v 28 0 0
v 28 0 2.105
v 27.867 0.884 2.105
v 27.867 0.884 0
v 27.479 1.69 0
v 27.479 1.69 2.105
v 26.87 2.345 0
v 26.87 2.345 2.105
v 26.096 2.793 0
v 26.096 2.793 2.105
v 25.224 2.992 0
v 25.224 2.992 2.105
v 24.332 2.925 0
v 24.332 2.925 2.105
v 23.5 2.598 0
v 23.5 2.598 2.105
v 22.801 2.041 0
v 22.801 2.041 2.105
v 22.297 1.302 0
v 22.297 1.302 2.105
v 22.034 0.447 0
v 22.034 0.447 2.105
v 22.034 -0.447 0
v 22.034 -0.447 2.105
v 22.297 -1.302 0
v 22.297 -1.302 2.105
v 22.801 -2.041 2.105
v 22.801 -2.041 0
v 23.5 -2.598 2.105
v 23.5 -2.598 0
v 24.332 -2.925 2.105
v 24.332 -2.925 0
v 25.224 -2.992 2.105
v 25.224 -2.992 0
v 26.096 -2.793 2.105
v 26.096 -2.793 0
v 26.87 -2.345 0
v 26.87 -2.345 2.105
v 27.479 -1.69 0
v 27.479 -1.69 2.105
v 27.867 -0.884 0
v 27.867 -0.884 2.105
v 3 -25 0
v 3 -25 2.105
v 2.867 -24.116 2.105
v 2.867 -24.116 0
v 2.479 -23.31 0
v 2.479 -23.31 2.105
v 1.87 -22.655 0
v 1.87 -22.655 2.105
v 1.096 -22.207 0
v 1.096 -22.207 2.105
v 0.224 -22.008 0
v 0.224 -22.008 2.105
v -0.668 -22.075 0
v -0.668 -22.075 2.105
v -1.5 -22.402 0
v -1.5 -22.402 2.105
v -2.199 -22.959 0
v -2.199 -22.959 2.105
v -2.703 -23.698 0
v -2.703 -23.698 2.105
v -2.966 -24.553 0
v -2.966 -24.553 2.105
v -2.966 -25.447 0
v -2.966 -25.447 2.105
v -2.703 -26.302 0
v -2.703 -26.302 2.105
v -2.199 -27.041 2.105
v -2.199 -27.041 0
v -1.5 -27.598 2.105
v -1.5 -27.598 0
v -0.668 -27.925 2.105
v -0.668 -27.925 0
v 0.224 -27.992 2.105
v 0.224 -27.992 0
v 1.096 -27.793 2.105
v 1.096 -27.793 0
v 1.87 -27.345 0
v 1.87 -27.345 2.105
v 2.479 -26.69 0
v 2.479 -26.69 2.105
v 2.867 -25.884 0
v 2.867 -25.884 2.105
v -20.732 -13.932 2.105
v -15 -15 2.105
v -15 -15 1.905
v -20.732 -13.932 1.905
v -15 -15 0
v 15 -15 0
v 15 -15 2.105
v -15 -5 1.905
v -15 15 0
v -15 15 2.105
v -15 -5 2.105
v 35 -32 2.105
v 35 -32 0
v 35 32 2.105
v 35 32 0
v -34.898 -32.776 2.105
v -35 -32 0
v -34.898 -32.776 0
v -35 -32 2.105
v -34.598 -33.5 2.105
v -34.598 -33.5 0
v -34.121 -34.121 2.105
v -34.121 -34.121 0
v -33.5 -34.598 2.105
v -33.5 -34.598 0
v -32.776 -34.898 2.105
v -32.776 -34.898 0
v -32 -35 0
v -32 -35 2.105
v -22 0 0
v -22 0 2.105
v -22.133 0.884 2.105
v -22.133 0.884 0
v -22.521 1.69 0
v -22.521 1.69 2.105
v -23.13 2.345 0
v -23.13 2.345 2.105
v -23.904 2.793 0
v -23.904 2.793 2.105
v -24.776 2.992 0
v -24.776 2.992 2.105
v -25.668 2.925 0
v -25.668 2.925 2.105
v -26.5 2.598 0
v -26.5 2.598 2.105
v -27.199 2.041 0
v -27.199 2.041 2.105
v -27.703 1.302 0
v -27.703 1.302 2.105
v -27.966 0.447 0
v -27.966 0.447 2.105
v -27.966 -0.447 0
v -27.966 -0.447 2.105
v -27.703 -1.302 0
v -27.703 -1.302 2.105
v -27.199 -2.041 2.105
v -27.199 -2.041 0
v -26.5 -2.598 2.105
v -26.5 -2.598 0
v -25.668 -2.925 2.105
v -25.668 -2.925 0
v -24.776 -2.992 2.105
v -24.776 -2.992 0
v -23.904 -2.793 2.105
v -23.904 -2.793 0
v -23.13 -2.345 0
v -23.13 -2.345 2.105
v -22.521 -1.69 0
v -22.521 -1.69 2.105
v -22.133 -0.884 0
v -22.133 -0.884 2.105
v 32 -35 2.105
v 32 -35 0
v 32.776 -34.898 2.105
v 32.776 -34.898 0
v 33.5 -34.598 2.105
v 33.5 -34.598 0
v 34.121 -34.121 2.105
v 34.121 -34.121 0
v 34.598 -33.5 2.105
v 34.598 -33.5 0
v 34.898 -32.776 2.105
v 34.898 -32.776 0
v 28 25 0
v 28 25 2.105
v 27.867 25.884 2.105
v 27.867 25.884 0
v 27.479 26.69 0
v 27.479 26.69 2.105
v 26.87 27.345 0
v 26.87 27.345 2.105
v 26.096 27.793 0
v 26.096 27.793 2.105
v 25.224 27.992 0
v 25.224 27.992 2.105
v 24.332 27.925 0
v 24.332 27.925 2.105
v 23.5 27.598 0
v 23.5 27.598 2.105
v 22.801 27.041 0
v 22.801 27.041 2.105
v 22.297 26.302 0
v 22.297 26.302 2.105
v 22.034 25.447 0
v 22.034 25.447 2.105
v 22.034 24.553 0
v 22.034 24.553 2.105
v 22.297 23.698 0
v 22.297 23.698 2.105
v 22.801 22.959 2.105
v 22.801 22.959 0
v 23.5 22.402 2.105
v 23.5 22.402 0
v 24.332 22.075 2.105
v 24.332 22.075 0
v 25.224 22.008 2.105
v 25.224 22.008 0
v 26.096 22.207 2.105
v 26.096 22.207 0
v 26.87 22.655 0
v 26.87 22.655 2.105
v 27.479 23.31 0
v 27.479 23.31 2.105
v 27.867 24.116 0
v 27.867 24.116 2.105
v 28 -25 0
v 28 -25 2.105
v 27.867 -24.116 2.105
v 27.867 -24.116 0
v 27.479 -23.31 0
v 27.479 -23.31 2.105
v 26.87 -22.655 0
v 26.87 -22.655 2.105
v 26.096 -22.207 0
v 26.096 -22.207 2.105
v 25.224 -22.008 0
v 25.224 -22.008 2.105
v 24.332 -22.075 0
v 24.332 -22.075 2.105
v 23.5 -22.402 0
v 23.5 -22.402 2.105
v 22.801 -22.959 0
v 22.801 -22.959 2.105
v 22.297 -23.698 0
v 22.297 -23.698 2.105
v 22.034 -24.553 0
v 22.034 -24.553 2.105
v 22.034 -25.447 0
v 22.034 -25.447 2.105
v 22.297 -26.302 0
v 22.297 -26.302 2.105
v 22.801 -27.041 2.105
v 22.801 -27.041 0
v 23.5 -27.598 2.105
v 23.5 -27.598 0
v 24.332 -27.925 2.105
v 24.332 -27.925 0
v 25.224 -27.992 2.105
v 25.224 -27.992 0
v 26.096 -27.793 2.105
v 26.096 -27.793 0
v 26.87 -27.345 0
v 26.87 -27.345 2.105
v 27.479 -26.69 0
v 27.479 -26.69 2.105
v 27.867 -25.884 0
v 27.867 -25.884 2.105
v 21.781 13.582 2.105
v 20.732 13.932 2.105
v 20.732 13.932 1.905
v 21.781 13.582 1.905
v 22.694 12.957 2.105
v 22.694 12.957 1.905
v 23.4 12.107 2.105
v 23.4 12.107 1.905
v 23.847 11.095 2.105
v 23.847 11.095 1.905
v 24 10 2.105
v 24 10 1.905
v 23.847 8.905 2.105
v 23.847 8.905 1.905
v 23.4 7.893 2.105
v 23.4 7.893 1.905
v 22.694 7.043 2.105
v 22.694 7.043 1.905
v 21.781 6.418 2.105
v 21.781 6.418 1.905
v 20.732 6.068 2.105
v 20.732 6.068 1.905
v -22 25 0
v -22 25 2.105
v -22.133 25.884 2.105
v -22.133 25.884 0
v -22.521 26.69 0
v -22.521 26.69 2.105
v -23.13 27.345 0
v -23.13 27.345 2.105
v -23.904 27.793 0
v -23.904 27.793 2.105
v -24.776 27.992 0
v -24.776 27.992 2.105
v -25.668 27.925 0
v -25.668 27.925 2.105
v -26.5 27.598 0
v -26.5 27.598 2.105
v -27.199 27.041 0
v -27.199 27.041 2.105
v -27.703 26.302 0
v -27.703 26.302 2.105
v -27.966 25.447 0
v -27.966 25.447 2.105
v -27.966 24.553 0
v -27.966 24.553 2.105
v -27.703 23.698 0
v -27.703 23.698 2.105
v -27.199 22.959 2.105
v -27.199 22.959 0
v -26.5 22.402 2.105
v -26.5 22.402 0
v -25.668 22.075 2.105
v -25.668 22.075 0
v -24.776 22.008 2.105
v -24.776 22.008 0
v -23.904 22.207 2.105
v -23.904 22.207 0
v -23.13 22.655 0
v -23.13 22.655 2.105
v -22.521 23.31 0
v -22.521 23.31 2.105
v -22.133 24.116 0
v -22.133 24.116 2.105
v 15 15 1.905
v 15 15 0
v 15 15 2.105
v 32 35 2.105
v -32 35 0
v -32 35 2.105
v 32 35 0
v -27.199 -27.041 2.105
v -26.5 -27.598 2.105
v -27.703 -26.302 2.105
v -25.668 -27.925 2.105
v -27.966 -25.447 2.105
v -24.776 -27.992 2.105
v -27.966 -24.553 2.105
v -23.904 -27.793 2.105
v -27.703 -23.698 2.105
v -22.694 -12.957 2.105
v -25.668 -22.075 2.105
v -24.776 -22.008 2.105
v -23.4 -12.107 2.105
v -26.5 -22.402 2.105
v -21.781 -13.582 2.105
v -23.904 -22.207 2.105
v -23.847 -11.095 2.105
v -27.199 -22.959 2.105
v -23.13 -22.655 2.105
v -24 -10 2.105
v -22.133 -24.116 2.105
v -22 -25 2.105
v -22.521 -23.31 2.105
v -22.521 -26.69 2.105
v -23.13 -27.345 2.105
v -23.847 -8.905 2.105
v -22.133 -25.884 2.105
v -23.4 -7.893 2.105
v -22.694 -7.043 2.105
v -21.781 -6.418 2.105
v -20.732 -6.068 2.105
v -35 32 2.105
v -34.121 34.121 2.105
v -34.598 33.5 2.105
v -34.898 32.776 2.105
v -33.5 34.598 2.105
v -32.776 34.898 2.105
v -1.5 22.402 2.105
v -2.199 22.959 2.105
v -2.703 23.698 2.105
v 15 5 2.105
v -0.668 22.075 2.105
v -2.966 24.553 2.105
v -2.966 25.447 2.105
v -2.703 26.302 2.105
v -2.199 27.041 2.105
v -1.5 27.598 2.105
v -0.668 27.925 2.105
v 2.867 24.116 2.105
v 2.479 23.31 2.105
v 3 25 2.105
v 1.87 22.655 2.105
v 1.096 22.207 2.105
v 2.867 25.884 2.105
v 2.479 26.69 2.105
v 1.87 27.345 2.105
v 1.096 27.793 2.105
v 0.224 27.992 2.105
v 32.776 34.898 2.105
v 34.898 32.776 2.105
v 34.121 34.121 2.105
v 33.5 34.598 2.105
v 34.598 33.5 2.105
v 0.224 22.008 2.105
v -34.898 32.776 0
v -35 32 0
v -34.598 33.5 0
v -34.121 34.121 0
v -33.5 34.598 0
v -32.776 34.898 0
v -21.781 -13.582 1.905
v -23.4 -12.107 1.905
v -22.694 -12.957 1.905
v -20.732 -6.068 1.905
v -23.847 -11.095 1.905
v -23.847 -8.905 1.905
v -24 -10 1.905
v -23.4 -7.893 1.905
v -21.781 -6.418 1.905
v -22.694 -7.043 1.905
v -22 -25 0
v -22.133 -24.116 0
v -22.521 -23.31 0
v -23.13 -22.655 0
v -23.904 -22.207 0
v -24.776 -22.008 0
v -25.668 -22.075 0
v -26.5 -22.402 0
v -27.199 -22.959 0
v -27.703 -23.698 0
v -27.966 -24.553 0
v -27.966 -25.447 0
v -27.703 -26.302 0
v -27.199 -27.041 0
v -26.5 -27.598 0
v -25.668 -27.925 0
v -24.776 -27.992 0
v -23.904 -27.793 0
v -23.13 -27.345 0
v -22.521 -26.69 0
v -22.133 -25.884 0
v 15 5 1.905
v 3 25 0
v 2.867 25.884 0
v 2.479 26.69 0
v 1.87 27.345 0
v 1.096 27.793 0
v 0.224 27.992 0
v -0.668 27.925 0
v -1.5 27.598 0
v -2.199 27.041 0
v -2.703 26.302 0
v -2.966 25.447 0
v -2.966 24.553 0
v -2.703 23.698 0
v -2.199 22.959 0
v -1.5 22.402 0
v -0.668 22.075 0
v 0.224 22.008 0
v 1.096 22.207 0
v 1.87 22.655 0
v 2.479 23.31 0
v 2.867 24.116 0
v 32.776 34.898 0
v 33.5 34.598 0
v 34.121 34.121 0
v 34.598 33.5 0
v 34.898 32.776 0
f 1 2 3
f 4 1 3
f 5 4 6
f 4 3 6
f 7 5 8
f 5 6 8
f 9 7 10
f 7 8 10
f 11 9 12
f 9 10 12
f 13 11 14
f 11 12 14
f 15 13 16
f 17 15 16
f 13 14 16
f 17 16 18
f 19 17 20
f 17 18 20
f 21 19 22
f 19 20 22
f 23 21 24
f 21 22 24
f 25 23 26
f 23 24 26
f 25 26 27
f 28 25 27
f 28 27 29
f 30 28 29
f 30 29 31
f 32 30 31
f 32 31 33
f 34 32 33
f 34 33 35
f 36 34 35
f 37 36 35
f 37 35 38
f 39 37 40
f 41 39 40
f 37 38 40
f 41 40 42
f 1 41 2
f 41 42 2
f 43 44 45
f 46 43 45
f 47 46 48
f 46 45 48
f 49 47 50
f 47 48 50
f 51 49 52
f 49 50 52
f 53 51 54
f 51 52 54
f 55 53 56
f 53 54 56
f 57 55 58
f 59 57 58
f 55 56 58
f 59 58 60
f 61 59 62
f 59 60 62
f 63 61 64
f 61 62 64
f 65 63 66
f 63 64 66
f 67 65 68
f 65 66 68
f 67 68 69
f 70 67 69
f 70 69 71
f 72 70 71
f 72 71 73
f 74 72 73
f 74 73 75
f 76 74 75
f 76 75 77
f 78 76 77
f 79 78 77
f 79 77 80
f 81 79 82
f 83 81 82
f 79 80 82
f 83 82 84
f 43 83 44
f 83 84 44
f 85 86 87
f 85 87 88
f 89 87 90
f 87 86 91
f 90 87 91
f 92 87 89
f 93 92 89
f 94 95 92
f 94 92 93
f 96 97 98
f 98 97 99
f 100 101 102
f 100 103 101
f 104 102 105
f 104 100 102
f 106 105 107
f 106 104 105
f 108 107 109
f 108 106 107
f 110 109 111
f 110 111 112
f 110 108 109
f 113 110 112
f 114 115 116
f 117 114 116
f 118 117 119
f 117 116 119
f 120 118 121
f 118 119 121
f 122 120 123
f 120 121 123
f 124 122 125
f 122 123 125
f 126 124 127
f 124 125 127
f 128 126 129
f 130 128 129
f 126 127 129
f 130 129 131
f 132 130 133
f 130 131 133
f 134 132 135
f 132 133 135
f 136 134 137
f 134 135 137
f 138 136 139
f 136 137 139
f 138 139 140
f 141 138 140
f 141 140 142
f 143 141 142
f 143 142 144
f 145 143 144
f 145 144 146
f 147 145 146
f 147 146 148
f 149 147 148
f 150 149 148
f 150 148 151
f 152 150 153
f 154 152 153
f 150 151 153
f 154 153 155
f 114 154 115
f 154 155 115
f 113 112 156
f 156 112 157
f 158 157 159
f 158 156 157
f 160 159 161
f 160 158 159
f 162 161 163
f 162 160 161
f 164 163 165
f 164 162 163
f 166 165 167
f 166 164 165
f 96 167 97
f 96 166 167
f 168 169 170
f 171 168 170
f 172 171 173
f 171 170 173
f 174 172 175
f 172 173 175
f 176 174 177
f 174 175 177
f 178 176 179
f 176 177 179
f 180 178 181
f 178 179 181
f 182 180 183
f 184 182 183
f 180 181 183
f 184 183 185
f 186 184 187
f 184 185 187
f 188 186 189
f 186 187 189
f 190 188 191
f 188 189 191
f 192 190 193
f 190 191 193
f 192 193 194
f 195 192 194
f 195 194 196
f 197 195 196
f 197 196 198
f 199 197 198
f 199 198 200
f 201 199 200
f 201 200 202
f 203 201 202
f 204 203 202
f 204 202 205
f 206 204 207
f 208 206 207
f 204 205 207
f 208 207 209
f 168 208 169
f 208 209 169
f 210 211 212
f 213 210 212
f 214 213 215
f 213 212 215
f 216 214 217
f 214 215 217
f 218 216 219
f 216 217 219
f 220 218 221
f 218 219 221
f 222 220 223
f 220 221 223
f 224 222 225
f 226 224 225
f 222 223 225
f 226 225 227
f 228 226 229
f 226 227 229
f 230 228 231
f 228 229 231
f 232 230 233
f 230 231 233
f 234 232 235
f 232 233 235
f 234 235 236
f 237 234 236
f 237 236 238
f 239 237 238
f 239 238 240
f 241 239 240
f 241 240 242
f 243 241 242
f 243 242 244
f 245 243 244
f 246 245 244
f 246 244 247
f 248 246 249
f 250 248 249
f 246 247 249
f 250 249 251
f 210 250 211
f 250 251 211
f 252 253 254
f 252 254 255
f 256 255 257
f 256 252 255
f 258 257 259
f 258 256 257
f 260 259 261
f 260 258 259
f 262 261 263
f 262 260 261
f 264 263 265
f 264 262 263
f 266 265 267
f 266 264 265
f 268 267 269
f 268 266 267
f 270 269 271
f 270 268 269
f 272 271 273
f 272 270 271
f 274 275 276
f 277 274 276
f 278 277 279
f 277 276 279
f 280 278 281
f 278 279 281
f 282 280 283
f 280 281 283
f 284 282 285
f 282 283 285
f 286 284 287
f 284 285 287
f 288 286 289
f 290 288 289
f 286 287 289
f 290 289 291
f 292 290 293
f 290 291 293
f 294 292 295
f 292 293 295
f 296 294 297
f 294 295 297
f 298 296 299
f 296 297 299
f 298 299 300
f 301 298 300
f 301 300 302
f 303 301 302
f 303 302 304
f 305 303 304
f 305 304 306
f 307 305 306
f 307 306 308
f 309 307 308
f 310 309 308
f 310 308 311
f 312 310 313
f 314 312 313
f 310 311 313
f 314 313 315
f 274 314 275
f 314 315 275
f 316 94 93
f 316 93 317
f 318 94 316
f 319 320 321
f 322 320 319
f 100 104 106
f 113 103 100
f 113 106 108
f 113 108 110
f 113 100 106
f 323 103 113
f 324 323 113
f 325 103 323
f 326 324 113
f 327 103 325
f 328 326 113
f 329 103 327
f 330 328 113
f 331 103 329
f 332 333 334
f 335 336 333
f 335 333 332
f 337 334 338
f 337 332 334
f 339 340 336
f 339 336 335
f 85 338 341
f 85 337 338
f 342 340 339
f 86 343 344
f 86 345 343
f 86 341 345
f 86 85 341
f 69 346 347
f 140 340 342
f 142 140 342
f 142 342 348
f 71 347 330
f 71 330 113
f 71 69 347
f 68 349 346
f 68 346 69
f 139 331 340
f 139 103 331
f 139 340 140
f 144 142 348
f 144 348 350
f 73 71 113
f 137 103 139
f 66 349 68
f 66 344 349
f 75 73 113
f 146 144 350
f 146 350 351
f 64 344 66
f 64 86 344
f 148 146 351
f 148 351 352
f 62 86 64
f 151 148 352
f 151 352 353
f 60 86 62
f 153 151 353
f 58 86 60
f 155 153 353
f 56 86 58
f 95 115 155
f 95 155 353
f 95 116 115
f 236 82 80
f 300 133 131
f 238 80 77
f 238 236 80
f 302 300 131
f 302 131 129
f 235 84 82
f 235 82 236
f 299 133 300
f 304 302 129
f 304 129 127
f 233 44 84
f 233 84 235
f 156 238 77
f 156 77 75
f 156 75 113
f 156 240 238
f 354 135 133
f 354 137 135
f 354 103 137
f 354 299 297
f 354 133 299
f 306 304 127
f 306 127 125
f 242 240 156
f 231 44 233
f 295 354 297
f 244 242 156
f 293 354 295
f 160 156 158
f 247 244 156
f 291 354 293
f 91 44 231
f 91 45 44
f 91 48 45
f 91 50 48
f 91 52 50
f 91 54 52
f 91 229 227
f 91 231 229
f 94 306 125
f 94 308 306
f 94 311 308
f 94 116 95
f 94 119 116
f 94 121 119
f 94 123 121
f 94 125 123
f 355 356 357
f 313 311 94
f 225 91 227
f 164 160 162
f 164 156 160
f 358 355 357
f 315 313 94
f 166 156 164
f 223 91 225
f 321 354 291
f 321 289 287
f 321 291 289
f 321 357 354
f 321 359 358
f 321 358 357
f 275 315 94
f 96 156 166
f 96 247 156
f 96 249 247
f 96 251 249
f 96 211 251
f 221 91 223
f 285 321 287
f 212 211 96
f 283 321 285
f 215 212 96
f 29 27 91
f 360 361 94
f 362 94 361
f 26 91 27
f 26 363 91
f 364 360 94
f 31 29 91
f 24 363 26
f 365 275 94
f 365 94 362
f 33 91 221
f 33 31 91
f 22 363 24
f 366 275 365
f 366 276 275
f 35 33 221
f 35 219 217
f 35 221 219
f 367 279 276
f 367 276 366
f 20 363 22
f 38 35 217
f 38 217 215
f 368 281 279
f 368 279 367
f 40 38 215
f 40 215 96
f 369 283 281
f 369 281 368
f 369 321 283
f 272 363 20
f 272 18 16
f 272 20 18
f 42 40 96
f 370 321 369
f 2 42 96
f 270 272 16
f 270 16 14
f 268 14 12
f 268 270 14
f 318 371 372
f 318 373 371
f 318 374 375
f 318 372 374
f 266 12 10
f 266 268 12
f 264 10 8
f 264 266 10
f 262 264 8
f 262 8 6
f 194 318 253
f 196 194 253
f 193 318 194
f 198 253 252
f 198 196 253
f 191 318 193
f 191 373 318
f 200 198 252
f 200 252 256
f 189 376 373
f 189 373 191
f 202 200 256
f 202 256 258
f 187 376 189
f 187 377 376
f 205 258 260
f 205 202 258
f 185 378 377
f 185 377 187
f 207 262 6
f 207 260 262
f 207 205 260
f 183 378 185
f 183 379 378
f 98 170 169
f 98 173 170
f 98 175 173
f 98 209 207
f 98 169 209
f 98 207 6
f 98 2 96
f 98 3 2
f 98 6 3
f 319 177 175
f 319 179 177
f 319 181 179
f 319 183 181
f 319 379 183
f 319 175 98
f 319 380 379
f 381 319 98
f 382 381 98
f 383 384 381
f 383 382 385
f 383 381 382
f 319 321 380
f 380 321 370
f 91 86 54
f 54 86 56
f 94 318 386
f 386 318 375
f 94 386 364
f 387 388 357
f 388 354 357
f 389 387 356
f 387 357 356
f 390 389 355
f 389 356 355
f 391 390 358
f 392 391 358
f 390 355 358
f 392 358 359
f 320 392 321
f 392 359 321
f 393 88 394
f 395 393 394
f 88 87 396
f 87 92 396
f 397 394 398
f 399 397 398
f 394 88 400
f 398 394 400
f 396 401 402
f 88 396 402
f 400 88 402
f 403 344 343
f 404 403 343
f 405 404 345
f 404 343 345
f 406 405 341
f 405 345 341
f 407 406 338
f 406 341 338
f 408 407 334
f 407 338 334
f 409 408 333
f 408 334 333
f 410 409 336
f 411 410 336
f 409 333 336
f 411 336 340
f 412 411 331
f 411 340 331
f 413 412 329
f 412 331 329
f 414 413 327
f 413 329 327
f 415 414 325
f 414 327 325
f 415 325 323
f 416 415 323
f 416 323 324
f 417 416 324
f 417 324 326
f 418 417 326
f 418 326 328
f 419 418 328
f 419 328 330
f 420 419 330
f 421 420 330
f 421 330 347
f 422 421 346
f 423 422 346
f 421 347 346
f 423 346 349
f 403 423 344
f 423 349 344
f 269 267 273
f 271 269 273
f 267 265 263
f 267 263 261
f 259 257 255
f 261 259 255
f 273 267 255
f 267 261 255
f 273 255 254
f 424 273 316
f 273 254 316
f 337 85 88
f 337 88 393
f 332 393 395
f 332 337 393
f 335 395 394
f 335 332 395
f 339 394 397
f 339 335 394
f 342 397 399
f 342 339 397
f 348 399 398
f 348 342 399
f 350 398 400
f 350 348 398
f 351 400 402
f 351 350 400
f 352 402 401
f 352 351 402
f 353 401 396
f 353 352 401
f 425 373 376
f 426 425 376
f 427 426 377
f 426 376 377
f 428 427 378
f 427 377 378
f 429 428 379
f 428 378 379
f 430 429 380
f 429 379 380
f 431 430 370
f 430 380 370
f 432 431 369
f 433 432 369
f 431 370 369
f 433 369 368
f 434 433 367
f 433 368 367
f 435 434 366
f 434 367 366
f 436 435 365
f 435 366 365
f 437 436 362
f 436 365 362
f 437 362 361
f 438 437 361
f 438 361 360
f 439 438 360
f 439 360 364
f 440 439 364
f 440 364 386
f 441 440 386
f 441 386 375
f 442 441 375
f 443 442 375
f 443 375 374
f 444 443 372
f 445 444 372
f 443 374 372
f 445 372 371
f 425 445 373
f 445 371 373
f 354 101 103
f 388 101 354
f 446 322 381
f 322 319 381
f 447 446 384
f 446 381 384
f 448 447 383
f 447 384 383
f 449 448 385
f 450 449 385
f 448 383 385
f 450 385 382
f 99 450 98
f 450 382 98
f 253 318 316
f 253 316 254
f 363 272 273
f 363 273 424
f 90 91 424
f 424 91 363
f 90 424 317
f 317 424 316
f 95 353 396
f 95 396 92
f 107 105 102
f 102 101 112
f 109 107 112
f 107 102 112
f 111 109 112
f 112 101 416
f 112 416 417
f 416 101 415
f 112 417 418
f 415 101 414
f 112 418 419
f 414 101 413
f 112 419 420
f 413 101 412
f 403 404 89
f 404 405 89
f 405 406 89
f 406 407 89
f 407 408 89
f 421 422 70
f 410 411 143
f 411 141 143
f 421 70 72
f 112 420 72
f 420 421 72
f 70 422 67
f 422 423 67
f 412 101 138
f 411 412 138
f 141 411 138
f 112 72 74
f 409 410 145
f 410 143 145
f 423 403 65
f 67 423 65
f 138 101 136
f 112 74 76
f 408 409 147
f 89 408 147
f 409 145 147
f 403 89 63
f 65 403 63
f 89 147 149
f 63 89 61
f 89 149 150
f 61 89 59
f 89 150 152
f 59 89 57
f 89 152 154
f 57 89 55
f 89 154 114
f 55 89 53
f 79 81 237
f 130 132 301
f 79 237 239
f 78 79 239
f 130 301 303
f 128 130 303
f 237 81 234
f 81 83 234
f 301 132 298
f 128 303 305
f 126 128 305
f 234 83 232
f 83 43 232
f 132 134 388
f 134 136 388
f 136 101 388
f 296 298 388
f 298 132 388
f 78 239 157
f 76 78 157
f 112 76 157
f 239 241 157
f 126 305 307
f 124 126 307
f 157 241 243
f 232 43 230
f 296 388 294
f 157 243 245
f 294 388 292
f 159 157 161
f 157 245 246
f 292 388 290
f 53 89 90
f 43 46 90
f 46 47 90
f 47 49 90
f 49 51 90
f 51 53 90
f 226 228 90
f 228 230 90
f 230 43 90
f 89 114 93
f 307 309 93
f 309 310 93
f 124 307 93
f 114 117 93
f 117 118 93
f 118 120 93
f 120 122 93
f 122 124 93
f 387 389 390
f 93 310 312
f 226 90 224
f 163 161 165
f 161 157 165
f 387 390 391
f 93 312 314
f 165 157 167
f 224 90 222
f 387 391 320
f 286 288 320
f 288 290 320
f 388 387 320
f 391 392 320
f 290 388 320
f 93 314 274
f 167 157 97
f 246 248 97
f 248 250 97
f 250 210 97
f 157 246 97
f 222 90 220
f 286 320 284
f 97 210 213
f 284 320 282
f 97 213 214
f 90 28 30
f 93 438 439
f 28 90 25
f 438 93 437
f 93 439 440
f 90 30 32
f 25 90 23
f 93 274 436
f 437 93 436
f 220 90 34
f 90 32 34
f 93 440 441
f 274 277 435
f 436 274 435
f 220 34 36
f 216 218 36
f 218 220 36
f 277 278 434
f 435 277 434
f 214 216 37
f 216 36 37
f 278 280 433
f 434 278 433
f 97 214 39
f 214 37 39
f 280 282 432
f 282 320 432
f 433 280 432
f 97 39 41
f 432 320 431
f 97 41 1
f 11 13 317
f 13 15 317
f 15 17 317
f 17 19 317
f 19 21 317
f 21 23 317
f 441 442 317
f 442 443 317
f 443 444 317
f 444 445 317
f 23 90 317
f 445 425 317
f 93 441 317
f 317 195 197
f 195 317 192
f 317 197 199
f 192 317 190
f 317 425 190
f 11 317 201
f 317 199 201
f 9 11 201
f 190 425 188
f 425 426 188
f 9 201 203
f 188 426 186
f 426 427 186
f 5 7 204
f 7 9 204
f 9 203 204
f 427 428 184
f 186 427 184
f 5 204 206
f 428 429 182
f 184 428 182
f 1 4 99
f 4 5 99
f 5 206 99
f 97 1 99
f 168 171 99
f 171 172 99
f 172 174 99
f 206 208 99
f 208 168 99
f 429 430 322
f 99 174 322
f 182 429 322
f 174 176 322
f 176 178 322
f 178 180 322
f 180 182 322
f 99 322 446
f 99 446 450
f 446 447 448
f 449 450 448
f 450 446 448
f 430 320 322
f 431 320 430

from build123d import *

# Parameters (mm, degrees)
SKETCH3_W           = 70
SKETCH3_H           = 70
BOSS_EXTRUDE1_DEPTH = 2.105
SKETCH6_R           = 3
SKETCH6_W           = 30
SKETCH6_H           = 30
CUT_EXTRUDE5_DEPTH  = 2.105
CUT_EXTRUDE7_DEPTH  = 0.2
FILLET1_R           = 3


with BuildPart() as part:
    # Sketch3 → Boss-Extrude1 (new body)
    with BuildSketch(Plane.XY):
        Rectangle(SKETCH3_W, SKETCH3_H)
    extrude(amount=BOSS_EXTRUDE1_DEPTH)

    # Sketch6 → Cut-Extrude5 (cut)
    with BuildSketch(Plane.XY.offset(2.105)):
        with Locations((0, 25)):
            Circle(SKETCH6_R)
        with Locations((25, 25)):
            Circle(SKETCH6_R)
        with Locations((25, 0)):
            Circle(SKETCH6_R)
        with Locations((25, -25)):
            Circle(SKETCH6_R)
        with Locations((0, -25)):
            Circle(SKETCH6_R)
        with Locations((-25, -25)):
            Circle(SKETCH6_R)
        with Locations((-25, 0)):
            Circle(SKETCH6_R)
        with Locations((-25, 25)):
            Circle(SKETCH6_R)
        Rectangle(SKETCH6_W, SKETCH6_H)
    extrude(amount=-CUT_EXTRUDE5_DEPTH, mode=Mode.SUBTRACT)

    # Sketch8 → Cut-Extrude7 (cut)
    with BuildSketch(Plane.XY.offset(2.105)):
        with BuildLine():
            Line((15, 5), (15, 15))
            Line((15, 15), (20.732380758, 13.932380758))
            ThreePointArc((20.732380758, 13.932380758), (24, 10), (20.732380758, 6.067619242))
            Line((20.732380758, 6.067619242), (15, 5))
        make_face()
        with BuildLine():
            Line((-15, -15), (-20.732380758, -13.932380758))
            ThreePointArc((-20.732380758, -13.932380758), (-24, -10), (-20.732380758, -6.067619242))
            Line((-20.732380758, -6.067619242), (-15, -5))
            Line((-15, -5), (-15, -15))
        make_face()
    extrude(amount=-CUT_EXTRUDE7_DEPTH, mode=Mode.SUBTRACT)

    # Fillet1
    fillet1_edges = [part.edges().sort_by_distance(p)[0] for p in [
        (35, -35, 1.0525),
        (-35, -35, 1.0525),
        (-35, 35, 1.0525),
        (35, 35, 1.0525),
    ]]
    fillet(fillet1_edges, radius=FILLET1_R)


solid = part.part
